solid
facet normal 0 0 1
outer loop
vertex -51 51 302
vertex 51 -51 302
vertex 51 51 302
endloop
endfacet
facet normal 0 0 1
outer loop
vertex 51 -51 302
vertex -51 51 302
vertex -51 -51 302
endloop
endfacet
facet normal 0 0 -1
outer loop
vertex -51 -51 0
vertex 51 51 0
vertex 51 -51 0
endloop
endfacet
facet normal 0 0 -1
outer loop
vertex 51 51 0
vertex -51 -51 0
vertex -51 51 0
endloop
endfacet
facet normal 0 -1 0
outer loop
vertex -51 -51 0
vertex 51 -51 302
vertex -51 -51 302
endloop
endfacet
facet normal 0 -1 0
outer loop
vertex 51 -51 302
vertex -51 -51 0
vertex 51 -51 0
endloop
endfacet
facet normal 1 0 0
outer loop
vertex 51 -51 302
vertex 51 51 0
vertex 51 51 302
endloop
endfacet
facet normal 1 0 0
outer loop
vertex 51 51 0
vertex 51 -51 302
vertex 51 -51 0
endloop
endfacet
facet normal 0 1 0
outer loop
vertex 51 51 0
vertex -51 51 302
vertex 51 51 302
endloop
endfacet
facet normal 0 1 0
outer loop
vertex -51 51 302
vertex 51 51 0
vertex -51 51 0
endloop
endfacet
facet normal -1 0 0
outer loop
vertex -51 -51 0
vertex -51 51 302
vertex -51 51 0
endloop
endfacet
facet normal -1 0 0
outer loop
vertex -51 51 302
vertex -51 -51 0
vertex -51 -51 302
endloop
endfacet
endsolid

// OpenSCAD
// file: generated/params.scad
// GENERATED — do not edit.
// Source: data/**/*.toml, written by tools/gen_params.py (`just gen`).
// Edit the data, regenerate, and commit both. Units and provenance are in
// the trailing comment on each line; full notes are in the TOML.
cds_body_section = 100.0; // mm, rule: CDS 14.1, App. B drawings CDS-14-001 to -003
cds_body_section_tol = 0.1; // mm, rule: CDS 14.1, App. B title-block tolerance
cds_cg_offset_max = [[20.0, 20.0, 20.0], [20.0, 20.0, 45.0], [20.0, 20.0, 70.0]]; // mm, rule: CDS 14.1, Table 2
cds_mass_max = [2.0, 4.0, 6.0]; // kg, rule: CDS 14.1, Table 1
cds_material = ["Al 7075", "Al 6061", "Al 6082", "Al 5005", "Al 5052"]; // text, rule: CDS 14.1, 2.2.12.1
cds_protrusion_max = 6.5; // mm, rule: CDS 14.1, 2.2.3
cds_rail_contact_fraction_min = 0.75; // 1, rule: CDS 14.1, 2.2.9
cds_rail_edge_radius_min = 1.0; // mm, rule: CDS 14.1, 2.2.7
cds_rail_end_pad_min = 6.5; // mm, rule: CDS 14.1, 2.2.8
cds_rail_length = [113.5, 227.0, 340.5]; // mm, rule: CDS 14.1, App. B drawings (1U, 2U, 3U)
cds_rail_length_tol = 0.1; // mm, estimate: CDS 14.1, App. B title-block tolerance (assumed to apply to length)
cds_rail_roughness_max = 1.6; // um, rule: CDS 14.1, 2.2.6
cds_rail_standoff = [0.5, 7.0]; // mm, rule: CDS 14.1, App. B
cds_rail_width_min = 8.5; // mm, rule: CDS 14.1, 2.2.5
envelope_cds_units_max = 3; // 1, rule: CDS 14.1, App. B (1U, 2U, 3U are 1x1xn; 6U is 2x3)
envelope_default_family = "irec"; // text, recommendation: IREC R&R 2027 P1, Table 3-2 governs competition builds; CDS kept as a selectable profile
envelope_families = ["irec", "cds"]; // text, recommendation: Project decision: two envelope families, one chassis code path
envelope_min_airframe_id_irec_max = 144.25; // mm, derived: sqrt(2) x (irec.cube_unit.section + irec.cube_unit.section_tol)
envelope_min_airframe_id_irec_nominal = 141.42; // mm, derived: sqrt(2) x irec.cube_unit.section
irec_battery_allowed_chemistries = ["LiFePO4", "Li-ion cylindrical metal can", "NiMH metal case", "alkaline metal case", "lithium coin metal case"]; // text, rule: IREC DTEG 2027 P1, D&T-6.17.2
irec_battery_lipo_allowed = false; // bool, rule: IREC DTEG 2027 P1, D&T-6.17.1 (applied to payload by D&T-9.2.2)
irec_cube_unit_height_per_u = 100.0; // mm, rule: IREC R&R 2027 P1, Table 3-2
irec_cube_unit_height_tol = 2.0; // mm, rule: IREC R&R 2027 P1, Table 3-2
irec_cube_unit_no_protrusion_for_bonus = true; // bool, rule: IREC R&R 2027 P1, R&R-3.4.5.6
irec_cube_unit_section = 100.0; // mm, rule: IREC R&R 2027 P1, Table 3-2
irec_cube_unit_section_tol = 2.0; // mm, rule: IREC R&R 2027 P1, Table 3-2
irec_cube_unit_units_max = 6; // 1, rule: IREC R&R 2027 P1, Table 3-2
irec_deployable_landing_speed_max = 11.0; // m/s, rule: IREC DTEG 2027 P1, D&T-9.1.2; IREC R&R 2027 P1, R&R-3.4.6.1
irec_deployable_max_independent_bodies = 1; // 1, rule: IREC DTEG 2027 P1, D&T-9.1.4
irec_deployable_uas_allowed = false; // bool, rule: IREC DTEG 2027 P1, D&T-9.1.3
irec_energetics_payload_allowed = "recovery_only"; // text, rule: IREC DTEG 2027 P1, 9.3
irec_material_radioactive_max = 1.0; // uCi, rule: IREC R&R 2027 P1, R&R-3.4.4.4
irec_material_steel_cubesat_frame_allowed = false; // bool, rule: IREC DTEG 2027 P1, 8.3 footnote 13
irec_payload_ballast_form_units = 3; // 1, rule: IREC R&R 2027 P1, R&R-3.4.5.1
irec_payload_boilerplate_max = 1.15; // lb, rule: IREC R&R 2027 P1, R&R-3.4.5.4
irec_payload_mass_accept_fraction = 0.95; // 1, rule: IREC R&R 2027 P1, R&R-3.4.1.5
irec_payload_mass_min = 4.4; // lb, rule: IREC R&R 2027 P1, R&R-3.1.1 and R&R-3.4.1.1
irec_payload_mass_min_kg = 1.99581; // kg, derived: irec.payload.mass_min x 0.45359237 kg/lb
irec_payload_removable_for_weighing = true; // bool, rule: IREC R&R 2027 P1, R&R-3.4.3.2
irec_payload_two_stage_location = "sustainer"; // text, rule: IREC R&R 2027 P1, R&R-3.4.3.1; IREC DTEG 2027 P1, D&T-9.5.1
irec_pcb_connector_may_be_structural = false; // bool, rule: IREC DTEG 2027 P1, D&T-6.12.3 and App. B3.6
irec_pcb_stake_component_mass_over = 7.0; // gram, rule: IREC DTEG 2027 P1, App. B3.6
irec_rail_exit_speed_min = 25.0; // m/s, rule: IREC DTEG 2027 P1, D&T-5.3.1
irec_recovery_drogue_rate = [20.0, 40.0]; // m/s, rule: IREC DTEG 2027 P1, D&T-6.3.3
irec_recovery_main_alt_max = 457.0; // m, rule: IREC DTEG 2027 P1, D&T-6.4.1
irec_score_cube_bonus = 50; // pts, rule: IREC R&R 2027 P1, R&R-6.7.1 'Payload Form-Factor Bonus'
irec_score_payload_violation = -100; // pts, rule: IREC R&R 2027 P1, R&R-6.7.1 'Payload Requirement Penalty'
lc_altimeter_official_on_payload_allowed = false; // bool, rule: LC R&R 2026 R3, 3.4
lc_deployable_speed_max_below_1500ft = 9.0; // m/s, rule: LC DTEG R4, R9.2.2
lc_energetics_payload_allowed = "per DTEG section 5"; // text, rule: LC DTEG R4, R9.5.1
lc_junior_payload_mass_max = 1.0; // kg, rule: LC R&R 2026 R3, App. C.3 and C.4.5
lc_payload_bonus_points = "fixed amount, not stated"; // text, rule: LC R&R 2026 R3, 6.1
lc_payload_form_factor_constrained = false; // bool, rule: LC R&R 2026 R3, 2.3
lc_payload_may_influence_trajectory = false; // bool, rule: LC R&R 2026 R3, 2.3
lc_payload_required = false; // bool, rule: LC R&R 2026 R3, 2.3
lc_recovery_landing_speed_max = 9.0; // m/s, rule: LC DTEG R4, R4.3.1
librecube_board_corner_radius = 1.0; // mm, rule: LibreCube board spec
librecube_board_hole_diameter = 3.2; // mm, rule: LibreCube board spec, board_dimensions.png
librecube_board_holes = [[5.0, 5.0], [85.0, 5.0], [9.0, 91.0], [82.5, 91.0]]; // mm, rule: LibreCube board spec, board_dimensions.png
librecube_board_size = [90.0, 96.0]; // mm, rule: LibreCube board spec, board_dimensions.png
librecube_board_thickness = 1.6; // mm, rule: LibreCube board spec
librecube_component_height_bottom = 4.5; // mm, rule: LibreCube board spec
librecube_component_height_top = 8.5; // mm, rule: LibreCube board spec
librecube_stack_pitch = 16.0; // mm, rule: LibreCube board spec
load_design_axial_limit = 50.0; // g_n, recommendation: load.measured.main_deploy_peak_high_rate (45 g) rounded up for margin
load_design_factor_of_safety_ultimate = 1.5; // 1, recommendation: Common aerospace practice for limit-to-ultimate
load_design_landing = 100.0; // g_n, estimate: a = v^2 / (2 d) with v = 9 to 11 m/s (LC DTEG R4 R4.3.1; IREC DTEG 2027 P1 D&T-6.4.3) and d = 50 mm
load_design_lateral_limit = 10.0; // g_n, estimate: No lateral data extracted; engineering judgement
load_measured_boost_axial_peak = [10.9, 12.8]; // g_n, measured: burnoutlabs/post-flight-analysis data/{2022-06-24_prometheus_sac22,2024-06-21_hyperion1_sac24,2025-08-21_hyperion2_lc25}/interim/telemega_std.csv (a_up_mps2, state=boost); 2025-08-21_hyperion2_lc25/interim/blueraven_hr_std.csv
load_measured_main_deploy_peak_high_rate = 45.0; // g_n, measured: burnoutlabs/post-flight-analysis data/2025-08-21_hyperion2_lc25/interim/blueraven_hr_std.csv (|accel_xyz_g|)
load_measured_main_deploy_peak_telemega = [20.2, 33.7]; // g_n, measured: burnoutlabs/post-flight-analysis data/*/interim/telemega_std.csv (|a_up_mps2|, state=main)
load_published_boost_axial_sim = [15.1, 23.7]; // g_n, estimate: IREC/SAC team technical reports: 2018 teams 40, 21, 79; 2024 team 71 (soundingrocket.org and team-hosted PDFs)
pc104_board_hole_diameter = 3.18; // mm, rule: PC/104 v2.5, App. A Fig. 3
pc104_board_holes = [[5.08, 5.08], [5.08, 85.09], [90.81, 8.89], [90.81, 82.55]]; // mm, rule: PC/104 v2.5, App. A Fig. 3
pc104_board_size = [95.89, 90.17]; // mm, rule: PC/104 v2.5, App. A Fig. 3
pc104_board_thickness = 1.57; // mm, rule: PC/104 v2.5, App. A Fig. 3
pc104_component_height_bottom = 2.54; // mm, rule: PC/104 v2.5, App. A Fig. 3
pc104_component_height_top = 11.05; // mm, rule: PC/104 v2.5, App. A Fig. 3
pc104_stack_pitch = 15.24; // mm, rule: PC/104 v2.5, Fig. 1
// main file
// envelope.scad: the payload envelope box for each envelope family.
//
// This is the keep-in volume a chassis must fit, not a chassis. Every
// dimension comes from generated/params.scad, which tools/gen_params.py
// writes from data/. Do not hard-code a dimension here; add it to data/.
//
// Top-level parameters (override with -D):
//   FAMILY         "irec" = ESRA Payload Cube Unit, 100 n mm +/- 2 (default,
//                  from envelope_default_family); "cds" = CubeSat Design Spec,
//                  rail lengths 113.5 / 227.0 / 340.5 mm
//   UNITS          size in U: irec 1..irec_cube_unit_units_max,
//                  cds 1..envelope_cds_units_max
//   BOUND          "max" = nominal + tolerance, "nominal", "min" = nominal - tolerance
//   SHOW_AIRFRAME  true ghosts the smallest round bore that passes the section
//
// Example:
//   openscad -D 'FAMILY="cds"' -D UNITS=3 -D 'BOUND="max"' -o cds-3u.stl scad/envelope.scad
//
// Library use: `use <envelope.scad>` gives payload_envelope(),
// payload_envelope_size() and min_airframe_id() without the top-level render.

include <generated/params.scad>

FAMILY = envelope_default_family;
UNITS = 3;
BOUND = "max";
SHOW_AIRFRAME = false;

// +1, 0 or -1: which side of the tolerance band to take.
function _bound_sign(bound) =
    bound == "max" ? 1 : bound == "nominal" ? 0 : bound == "min" ? -1 : undef;

// [x, y, z] in mm of the envelope for a family, size and bound.
function payload_envelope_size(family = "irec", units = 3, bound = "max") =
    let (sgn = _bound_sign(bound))
    assert(!is_undef(sgn), str("BOUND must be \"max\", \"nominal\" or \"min\", got ", bound))
    assert(is_num(units) && units == floor(units), str("UNITS must be a whole number, got ", units))
    family == "irec"
        ? assert(units >= 1 && units <= irec_cube_unit_units_max,
                 str("irec UNITS must be 1..", irec_cube_unit_units_max, ", got ", units))
          let (s = irec_cube_unit_section + sgn * irec_cube_unit_section_tol,
               h = irec_cube_unit_height_per_u * units + sgn * irec_cube_unit_height_tol)
          [s, s, h]
    : family == "cds"
        ? assert(units >= 1 && units <= min(envelope_cds_units_max, len(cds_rail_length)),
                 str("cds UNITS must be 1..", envelope_cds_units_max, ", got ", units))
          let (s = cds_body_section + sgn * cds_body_section_tol,
               h = cds_rail_length[units - 1] + sgn * cds_rail_length_tol)
          [s, s, h]
    : assert(false, str("FAMILY must be one of ", envelope_families, ", got ", family));

// Smallest airframe inner diameter that passes a [width, depth] cross-section:
// its diagonal. No radial clearance is added.
function min_airframe_id(section) = norm([section[0], section[1]]);

// The envelope as a solid, centred on the Z axis, base on Z = 0.
module payload_envelope(family = "irec", units = 3, bound = "max") {
    size = payload_envelope_size(family, units, bound);
    translate([-size.x / 2, -size.y / 2, 0]) cube(size);
}

// --- Top-level render ---------------------------------------------------------

_size = payload_envelope_size(FAMILY, UNITS, BOUND);
echo(str("ENVELOPE family=", FAMILY, " units=", UNITS, " bound=", BOUND,
         " size_mm=", _size, " min_airframe_id_mm=", min_airframe_id(_size)));

payload_envelope(FAMILY, UNITS, BOUND);
if (SHOW_AIRFRAME)
    %cylinder(d = min_airframe_id(_size), h = _size.z, $fn = 96);
